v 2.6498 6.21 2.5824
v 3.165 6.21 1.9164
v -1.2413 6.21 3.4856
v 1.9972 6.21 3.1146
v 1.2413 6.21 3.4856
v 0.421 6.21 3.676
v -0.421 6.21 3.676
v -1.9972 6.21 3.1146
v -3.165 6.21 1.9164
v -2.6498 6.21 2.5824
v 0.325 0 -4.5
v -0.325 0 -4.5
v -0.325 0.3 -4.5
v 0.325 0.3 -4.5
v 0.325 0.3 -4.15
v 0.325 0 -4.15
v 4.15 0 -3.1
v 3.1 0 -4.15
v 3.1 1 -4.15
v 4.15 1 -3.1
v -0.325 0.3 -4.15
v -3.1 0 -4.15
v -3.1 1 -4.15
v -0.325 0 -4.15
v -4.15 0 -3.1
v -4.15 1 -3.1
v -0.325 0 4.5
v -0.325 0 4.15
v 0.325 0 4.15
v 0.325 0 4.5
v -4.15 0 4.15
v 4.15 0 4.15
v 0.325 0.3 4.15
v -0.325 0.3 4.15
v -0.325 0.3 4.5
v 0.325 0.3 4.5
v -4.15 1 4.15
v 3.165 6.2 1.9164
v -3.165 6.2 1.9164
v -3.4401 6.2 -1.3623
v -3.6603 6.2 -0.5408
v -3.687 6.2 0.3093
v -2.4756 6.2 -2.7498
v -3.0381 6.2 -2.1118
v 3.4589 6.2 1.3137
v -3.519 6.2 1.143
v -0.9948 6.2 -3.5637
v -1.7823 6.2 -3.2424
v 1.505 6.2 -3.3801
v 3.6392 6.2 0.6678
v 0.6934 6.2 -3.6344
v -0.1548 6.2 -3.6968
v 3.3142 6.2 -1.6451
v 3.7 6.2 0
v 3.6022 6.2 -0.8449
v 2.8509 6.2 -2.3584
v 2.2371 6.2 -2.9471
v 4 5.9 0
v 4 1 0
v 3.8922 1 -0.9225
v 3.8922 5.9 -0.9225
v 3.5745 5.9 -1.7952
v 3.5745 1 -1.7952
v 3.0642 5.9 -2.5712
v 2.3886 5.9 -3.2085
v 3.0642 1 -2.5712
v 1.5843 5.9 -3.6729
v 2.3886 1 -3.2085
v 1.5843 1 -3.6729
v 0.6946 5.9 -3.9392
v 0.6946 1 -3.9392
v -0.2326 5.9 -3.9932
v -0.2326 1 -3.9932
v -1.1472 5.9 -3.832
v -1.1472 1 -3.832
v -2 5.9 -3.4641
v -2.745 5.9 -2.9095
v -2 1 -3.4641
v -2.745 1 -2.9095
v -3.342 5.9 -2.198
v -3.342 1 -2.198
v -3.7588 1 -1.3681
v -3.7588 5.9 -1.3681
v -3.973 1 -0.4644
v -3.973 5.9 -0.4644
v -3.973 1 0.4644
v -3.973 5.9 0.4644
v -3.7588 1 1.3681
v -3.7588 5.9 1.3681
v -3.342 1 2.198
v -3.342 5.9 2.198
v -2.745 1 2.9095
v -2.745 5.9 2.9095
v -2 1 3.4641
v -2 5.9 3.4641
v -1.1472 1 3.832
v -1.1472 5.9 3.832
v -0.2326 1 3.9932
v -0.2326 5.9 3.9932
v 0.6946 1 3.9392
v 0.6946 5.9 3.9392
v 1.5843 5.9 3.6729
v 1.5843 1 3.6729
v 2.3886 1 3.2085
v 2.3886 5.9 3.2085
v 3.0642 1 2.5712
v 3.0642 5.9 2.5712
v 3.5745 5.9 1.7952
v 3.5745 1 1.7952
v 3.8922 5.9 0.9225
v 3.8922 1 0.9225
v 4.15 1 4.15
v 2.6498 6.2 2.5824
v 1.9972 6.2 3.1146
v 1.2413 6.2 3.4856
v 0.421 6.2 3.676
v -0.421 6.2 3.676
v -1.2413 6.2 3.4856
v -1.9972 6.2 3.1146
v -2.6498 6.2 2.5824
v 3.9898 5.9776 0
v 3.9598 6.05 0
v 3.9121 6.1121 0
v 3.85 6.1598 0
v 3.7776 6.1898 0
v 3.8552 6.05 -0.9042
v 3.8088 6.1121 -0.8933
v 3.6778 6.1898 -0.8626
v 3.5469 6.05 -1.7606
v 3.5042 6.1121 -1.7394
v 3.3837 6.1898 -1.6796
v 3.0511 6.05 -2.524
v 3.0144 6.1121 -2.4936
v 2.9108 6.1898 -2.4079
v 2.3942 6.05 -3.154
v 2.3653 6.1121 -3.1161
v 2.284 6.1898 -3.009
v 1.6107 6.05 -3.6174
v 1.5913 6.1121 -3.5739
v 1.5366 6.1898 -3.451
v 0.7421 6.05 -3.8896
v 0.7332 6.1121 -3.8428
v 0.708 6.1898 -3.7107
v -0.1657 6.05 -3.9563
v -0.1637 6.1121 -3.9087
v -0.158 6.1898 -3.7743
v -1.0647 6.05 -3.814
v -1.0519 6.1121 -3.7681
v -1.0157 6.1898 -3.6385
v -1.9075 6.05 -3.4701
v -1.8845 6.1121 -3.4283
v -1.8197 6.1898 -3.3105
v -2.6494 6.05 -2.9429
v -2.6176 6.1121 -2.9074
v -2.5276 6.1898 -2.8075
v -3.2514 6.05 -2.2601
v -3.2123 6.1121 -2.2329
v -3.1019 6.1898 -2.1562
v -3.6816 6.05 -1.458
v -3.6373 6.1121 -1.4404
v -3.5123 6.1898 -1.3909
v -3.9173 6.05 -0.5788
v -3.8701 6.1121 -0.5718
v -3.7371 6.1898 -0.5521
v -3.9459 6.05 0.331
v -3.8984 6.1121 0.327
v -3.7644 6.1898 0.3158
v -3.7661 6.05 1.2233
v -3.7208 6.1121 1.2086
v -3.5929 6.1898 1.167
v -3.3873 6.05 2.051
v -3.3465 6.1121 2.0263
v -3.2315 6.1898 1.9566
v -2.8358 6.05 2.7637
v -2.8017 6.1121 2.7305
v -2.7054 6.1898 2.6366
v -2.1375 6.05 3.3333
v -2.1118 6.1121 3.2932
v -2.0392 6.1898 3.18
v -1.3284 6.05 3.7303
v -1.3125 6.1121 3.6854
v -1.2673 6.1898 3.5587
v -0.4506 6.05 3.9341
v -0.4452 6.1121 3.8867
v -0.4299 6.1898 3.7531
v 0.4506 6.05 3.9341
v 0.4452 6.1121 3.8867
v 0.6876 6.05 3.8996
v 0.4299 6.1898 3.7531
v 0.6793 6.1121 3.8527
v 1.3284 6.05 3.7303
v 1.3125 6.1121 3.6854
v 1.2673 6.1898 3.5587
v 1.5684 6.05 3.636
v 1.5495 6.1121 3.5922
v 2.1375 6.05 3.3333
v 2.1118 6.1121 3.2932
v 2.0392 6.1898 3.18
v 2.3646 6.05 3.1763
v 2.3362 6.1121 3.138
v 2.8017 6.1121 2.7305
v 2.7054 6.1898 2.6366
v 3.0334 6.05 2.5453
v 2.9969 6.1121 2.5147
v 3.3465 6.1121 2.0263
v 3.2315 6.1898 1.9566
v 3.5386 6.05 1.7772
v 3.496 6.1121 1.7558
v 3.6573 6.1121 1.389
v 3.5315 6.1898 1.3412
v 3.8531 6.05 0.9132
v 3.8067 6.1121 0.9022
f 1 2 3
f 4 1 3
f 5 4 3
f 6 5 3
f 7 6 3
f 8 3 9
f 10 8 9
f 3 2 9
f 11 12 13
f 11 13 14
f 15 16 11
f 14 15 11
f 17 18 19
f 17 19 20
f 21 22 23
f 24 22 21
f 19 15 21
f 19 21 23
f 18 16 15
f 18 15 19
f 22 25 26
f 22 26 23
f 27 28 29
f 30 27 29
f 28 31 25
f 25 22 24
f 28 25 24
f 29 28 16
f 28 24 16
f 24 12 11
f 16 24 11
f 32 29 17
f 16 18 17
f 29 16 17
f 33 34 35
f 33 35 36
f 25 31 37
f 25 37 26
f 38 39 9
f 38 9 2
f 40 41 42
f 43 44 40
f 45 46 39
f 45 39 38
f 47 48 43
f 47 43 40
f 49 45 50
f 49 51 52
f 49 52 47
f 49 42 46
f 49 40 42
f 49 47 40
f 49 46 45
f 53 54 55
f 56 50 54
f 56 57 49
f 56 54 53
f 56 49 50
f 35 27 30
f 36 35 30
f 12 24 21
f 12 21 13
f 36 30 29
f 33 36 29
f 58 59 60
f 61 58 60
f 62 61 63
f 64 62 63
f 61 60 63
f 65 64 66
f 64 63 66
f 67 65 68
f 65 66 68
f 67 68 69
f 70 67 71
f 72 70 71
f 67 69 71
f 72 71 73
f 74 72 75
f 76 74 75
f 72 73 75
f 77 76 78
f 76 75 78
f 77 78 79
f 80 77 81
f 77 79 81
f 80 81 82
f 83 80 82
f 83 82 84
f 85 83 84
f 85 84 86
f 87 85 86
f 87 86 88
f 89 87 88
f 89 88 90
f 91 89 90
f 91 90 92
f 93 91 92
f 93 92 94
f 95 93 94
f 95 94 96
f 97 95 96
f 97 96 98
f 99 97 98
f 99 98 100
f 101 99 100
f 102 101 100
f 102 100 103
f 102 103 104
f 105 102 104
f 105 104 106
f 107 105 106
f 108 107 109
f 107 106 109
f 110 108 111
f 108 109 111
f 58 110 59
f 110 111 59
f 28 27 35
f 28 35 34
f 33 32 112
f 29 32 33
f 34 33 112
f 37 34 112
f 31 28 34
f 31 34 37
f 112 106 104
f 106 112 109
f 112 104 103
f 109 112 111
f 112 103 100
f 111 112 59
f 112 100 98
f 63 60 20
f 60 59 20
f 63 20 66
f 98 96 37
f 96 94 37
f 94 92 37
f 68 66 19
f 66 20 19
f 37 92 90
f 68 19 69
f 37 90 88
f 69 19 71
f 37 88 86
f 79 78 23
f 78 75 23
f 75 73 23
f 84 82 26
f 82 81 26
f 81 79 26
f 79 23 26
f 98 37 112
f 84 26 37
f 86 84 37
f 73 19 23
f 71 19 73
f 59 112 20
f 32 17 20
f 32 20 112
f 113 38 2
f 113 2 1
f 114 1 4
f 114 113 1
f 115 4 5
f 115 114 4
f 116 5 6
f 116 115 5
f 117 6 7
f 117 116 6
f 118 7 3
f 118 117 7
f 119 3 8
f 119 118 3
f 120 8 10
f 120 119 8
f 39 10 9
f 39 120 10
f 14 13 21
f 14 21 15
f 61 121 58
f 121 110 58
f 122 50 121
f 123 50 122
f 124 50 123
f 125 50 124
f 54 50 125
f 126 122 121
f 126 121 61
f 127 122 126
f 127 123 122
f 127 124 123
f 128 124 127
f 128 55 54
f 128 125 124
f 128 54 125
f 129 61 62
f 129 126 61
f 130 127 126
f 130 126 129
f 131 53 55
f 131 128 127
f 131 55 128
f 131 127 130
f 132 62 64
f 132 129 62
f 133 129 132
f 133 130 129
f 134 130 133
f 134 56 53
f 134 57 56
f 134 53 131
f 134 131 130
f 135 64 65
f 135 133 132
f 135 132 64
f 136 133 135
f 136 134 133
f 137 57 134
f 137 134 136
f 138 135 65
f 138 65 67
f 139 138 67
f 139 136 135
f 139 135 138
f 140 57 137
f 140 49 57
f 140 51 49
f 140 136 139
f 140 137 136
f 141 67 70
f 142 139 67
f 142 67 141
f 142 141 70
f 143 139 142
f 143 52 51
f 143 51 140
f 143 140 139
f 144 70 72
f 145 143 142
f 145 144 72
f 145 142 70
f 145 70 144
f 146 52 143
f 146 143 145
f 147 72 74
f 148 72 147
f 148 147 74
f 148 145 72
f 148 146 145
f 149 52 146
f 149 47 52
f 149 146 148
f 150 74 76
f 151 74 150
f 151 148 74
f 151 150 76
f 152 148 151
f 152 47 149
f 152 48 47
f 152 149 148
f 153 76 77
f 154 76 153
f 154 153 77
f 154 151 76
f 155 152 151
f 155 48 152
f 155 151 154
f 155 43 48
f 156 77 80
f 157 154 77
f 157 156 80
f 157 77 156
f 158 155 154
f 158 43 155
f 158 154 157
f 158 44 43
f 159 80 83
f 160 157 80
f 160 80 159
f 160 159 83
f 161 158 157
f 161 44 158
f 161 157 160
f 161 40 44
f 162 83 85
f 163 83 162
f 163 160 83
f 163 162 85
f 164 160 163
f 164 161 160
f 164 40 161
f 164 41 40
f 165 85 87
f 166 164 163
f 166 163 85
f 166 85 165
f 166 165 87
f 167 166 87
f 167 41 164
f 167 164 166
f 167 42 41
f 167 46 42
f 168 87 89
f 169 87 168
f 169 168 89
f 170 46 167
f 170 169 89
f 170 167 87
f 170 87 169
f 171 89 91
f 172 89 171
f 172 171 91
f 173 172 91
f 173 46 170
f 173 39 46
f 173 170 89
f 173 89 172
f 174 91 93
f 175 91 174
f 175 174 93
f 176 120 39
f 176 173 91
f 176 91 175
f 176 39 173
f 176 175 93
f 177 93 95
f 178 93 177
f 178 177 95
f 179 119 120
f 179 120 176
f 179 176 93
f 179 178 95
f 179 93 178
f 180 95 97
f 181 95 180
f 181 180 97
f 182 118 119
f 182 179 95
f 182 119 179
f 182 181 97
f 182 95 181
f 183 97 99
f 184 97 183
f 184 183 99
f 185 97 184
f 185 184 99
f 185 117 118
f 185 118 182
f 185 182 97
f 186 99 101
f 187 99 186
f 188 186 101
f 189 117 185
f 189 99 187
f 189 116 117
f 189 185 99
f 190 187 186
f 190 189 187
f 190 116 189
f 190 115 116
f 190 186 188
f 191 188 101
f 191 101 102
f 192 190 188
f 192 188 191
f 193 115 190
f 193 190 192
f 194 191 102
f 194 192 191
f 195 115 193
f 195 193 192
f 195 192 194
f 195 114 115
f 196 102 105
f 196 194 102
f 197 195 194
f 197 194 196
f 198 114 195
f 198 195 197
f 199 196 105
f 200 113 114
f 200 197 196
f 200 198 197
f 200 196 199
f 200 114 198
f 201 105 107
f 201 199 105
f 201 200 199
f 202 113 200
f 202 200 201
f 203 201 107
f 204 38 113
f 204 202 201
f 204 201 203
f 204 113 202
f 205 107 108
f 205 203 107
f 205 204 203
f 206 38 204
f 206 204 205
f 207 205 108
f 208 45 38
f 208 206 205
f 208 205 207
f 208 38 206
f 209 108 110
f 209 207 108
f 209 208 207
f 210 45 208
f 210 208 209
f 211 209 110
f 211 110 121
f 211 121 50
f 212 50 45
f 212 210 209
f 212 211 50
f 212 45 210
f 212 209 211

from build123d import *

# Parameters (mm, degrees)
BOSS_EXTRUDE1_DEPTH = 1
SKETCH3_R           = 4
BOSS_EXTRUDE2_DEPTH = 6.2
FILLET1_R           = 0.3
SKETCH4_W           = 0.65
SKETCH4_H           = 3.4
BOSS_EXTRUDE3_DEPTH = 0.3
BOSS_EXTRUDE4_DEPTH = 0.01


with BuildPart() as part:
    # Sketch2 → Boss-Extrude1 (new body)
    with BuildSketch(Plane(origin=(0, 0, 0), x_dir=(1, 0, 0), z_dir=(0, 1, 0))):
        Polygon((4.15, -4.15), (-4.15, -4.15), (-4.15, 3.1), (-3.1, 4.15), (3.1, 4.15), (4.15, 3.1), align=None)
    extrude(amount=BOSS_EXTRUDE1_DEPTH)

    # Sketch3 → Boss-Extrude2 (add)
    with BuildSketch(Plane(origin=(0, 0, 0), x_dir=(1, 0, 0), z_dir=(0, 1, 0))):
        Circle(SKETCH3_R)
    extrude(amount=BOSS_EXTRUDE2_DEPTH)

    # Fillet1
    fillet1_edges = [part.edges().sort_by_distance(p)[0] for p in [
        (-4, 6.2, 0),
    ]]
    fillet(fillet1_edges, radius=FILLET1_R)

    # Sketch4 → Boss-Extrude3 (add)
    with BuildSketch(Plane(origin=(0, 0, 0), x_dir=(1, 0, 0), z_dir=(0, 1, 0))):
        with Locations((0, 2.8)):
            Rectangle(SKETCH4_W, SKETCH4_H)
        with Locations((0, -2.8)):
            Rectangle(SKETCH4_W, SKETCH4_H)
    extrude(amount=BOSS_EXTRUDE3_DEPTH)

    # Sketch5 → Boss-Extrude4 (add)
    with BuildSketch(Plane(origin=(0, 6.2, 0), x_dir=(1, 0, 0), z_dir=(0, 1, 0))):
        with BuildLine():
            Line((-3.165033817, -1.916392689), (3.165033817, -1.916392689))
            ThreePointArc((3.165033817, -1.916392689), (0, -3.7), (-3.165033817, -1.916392689))
        make_face()
    extrude(amount=BOSS_EXTRUDE4_DEPTH)


solid = part.part
